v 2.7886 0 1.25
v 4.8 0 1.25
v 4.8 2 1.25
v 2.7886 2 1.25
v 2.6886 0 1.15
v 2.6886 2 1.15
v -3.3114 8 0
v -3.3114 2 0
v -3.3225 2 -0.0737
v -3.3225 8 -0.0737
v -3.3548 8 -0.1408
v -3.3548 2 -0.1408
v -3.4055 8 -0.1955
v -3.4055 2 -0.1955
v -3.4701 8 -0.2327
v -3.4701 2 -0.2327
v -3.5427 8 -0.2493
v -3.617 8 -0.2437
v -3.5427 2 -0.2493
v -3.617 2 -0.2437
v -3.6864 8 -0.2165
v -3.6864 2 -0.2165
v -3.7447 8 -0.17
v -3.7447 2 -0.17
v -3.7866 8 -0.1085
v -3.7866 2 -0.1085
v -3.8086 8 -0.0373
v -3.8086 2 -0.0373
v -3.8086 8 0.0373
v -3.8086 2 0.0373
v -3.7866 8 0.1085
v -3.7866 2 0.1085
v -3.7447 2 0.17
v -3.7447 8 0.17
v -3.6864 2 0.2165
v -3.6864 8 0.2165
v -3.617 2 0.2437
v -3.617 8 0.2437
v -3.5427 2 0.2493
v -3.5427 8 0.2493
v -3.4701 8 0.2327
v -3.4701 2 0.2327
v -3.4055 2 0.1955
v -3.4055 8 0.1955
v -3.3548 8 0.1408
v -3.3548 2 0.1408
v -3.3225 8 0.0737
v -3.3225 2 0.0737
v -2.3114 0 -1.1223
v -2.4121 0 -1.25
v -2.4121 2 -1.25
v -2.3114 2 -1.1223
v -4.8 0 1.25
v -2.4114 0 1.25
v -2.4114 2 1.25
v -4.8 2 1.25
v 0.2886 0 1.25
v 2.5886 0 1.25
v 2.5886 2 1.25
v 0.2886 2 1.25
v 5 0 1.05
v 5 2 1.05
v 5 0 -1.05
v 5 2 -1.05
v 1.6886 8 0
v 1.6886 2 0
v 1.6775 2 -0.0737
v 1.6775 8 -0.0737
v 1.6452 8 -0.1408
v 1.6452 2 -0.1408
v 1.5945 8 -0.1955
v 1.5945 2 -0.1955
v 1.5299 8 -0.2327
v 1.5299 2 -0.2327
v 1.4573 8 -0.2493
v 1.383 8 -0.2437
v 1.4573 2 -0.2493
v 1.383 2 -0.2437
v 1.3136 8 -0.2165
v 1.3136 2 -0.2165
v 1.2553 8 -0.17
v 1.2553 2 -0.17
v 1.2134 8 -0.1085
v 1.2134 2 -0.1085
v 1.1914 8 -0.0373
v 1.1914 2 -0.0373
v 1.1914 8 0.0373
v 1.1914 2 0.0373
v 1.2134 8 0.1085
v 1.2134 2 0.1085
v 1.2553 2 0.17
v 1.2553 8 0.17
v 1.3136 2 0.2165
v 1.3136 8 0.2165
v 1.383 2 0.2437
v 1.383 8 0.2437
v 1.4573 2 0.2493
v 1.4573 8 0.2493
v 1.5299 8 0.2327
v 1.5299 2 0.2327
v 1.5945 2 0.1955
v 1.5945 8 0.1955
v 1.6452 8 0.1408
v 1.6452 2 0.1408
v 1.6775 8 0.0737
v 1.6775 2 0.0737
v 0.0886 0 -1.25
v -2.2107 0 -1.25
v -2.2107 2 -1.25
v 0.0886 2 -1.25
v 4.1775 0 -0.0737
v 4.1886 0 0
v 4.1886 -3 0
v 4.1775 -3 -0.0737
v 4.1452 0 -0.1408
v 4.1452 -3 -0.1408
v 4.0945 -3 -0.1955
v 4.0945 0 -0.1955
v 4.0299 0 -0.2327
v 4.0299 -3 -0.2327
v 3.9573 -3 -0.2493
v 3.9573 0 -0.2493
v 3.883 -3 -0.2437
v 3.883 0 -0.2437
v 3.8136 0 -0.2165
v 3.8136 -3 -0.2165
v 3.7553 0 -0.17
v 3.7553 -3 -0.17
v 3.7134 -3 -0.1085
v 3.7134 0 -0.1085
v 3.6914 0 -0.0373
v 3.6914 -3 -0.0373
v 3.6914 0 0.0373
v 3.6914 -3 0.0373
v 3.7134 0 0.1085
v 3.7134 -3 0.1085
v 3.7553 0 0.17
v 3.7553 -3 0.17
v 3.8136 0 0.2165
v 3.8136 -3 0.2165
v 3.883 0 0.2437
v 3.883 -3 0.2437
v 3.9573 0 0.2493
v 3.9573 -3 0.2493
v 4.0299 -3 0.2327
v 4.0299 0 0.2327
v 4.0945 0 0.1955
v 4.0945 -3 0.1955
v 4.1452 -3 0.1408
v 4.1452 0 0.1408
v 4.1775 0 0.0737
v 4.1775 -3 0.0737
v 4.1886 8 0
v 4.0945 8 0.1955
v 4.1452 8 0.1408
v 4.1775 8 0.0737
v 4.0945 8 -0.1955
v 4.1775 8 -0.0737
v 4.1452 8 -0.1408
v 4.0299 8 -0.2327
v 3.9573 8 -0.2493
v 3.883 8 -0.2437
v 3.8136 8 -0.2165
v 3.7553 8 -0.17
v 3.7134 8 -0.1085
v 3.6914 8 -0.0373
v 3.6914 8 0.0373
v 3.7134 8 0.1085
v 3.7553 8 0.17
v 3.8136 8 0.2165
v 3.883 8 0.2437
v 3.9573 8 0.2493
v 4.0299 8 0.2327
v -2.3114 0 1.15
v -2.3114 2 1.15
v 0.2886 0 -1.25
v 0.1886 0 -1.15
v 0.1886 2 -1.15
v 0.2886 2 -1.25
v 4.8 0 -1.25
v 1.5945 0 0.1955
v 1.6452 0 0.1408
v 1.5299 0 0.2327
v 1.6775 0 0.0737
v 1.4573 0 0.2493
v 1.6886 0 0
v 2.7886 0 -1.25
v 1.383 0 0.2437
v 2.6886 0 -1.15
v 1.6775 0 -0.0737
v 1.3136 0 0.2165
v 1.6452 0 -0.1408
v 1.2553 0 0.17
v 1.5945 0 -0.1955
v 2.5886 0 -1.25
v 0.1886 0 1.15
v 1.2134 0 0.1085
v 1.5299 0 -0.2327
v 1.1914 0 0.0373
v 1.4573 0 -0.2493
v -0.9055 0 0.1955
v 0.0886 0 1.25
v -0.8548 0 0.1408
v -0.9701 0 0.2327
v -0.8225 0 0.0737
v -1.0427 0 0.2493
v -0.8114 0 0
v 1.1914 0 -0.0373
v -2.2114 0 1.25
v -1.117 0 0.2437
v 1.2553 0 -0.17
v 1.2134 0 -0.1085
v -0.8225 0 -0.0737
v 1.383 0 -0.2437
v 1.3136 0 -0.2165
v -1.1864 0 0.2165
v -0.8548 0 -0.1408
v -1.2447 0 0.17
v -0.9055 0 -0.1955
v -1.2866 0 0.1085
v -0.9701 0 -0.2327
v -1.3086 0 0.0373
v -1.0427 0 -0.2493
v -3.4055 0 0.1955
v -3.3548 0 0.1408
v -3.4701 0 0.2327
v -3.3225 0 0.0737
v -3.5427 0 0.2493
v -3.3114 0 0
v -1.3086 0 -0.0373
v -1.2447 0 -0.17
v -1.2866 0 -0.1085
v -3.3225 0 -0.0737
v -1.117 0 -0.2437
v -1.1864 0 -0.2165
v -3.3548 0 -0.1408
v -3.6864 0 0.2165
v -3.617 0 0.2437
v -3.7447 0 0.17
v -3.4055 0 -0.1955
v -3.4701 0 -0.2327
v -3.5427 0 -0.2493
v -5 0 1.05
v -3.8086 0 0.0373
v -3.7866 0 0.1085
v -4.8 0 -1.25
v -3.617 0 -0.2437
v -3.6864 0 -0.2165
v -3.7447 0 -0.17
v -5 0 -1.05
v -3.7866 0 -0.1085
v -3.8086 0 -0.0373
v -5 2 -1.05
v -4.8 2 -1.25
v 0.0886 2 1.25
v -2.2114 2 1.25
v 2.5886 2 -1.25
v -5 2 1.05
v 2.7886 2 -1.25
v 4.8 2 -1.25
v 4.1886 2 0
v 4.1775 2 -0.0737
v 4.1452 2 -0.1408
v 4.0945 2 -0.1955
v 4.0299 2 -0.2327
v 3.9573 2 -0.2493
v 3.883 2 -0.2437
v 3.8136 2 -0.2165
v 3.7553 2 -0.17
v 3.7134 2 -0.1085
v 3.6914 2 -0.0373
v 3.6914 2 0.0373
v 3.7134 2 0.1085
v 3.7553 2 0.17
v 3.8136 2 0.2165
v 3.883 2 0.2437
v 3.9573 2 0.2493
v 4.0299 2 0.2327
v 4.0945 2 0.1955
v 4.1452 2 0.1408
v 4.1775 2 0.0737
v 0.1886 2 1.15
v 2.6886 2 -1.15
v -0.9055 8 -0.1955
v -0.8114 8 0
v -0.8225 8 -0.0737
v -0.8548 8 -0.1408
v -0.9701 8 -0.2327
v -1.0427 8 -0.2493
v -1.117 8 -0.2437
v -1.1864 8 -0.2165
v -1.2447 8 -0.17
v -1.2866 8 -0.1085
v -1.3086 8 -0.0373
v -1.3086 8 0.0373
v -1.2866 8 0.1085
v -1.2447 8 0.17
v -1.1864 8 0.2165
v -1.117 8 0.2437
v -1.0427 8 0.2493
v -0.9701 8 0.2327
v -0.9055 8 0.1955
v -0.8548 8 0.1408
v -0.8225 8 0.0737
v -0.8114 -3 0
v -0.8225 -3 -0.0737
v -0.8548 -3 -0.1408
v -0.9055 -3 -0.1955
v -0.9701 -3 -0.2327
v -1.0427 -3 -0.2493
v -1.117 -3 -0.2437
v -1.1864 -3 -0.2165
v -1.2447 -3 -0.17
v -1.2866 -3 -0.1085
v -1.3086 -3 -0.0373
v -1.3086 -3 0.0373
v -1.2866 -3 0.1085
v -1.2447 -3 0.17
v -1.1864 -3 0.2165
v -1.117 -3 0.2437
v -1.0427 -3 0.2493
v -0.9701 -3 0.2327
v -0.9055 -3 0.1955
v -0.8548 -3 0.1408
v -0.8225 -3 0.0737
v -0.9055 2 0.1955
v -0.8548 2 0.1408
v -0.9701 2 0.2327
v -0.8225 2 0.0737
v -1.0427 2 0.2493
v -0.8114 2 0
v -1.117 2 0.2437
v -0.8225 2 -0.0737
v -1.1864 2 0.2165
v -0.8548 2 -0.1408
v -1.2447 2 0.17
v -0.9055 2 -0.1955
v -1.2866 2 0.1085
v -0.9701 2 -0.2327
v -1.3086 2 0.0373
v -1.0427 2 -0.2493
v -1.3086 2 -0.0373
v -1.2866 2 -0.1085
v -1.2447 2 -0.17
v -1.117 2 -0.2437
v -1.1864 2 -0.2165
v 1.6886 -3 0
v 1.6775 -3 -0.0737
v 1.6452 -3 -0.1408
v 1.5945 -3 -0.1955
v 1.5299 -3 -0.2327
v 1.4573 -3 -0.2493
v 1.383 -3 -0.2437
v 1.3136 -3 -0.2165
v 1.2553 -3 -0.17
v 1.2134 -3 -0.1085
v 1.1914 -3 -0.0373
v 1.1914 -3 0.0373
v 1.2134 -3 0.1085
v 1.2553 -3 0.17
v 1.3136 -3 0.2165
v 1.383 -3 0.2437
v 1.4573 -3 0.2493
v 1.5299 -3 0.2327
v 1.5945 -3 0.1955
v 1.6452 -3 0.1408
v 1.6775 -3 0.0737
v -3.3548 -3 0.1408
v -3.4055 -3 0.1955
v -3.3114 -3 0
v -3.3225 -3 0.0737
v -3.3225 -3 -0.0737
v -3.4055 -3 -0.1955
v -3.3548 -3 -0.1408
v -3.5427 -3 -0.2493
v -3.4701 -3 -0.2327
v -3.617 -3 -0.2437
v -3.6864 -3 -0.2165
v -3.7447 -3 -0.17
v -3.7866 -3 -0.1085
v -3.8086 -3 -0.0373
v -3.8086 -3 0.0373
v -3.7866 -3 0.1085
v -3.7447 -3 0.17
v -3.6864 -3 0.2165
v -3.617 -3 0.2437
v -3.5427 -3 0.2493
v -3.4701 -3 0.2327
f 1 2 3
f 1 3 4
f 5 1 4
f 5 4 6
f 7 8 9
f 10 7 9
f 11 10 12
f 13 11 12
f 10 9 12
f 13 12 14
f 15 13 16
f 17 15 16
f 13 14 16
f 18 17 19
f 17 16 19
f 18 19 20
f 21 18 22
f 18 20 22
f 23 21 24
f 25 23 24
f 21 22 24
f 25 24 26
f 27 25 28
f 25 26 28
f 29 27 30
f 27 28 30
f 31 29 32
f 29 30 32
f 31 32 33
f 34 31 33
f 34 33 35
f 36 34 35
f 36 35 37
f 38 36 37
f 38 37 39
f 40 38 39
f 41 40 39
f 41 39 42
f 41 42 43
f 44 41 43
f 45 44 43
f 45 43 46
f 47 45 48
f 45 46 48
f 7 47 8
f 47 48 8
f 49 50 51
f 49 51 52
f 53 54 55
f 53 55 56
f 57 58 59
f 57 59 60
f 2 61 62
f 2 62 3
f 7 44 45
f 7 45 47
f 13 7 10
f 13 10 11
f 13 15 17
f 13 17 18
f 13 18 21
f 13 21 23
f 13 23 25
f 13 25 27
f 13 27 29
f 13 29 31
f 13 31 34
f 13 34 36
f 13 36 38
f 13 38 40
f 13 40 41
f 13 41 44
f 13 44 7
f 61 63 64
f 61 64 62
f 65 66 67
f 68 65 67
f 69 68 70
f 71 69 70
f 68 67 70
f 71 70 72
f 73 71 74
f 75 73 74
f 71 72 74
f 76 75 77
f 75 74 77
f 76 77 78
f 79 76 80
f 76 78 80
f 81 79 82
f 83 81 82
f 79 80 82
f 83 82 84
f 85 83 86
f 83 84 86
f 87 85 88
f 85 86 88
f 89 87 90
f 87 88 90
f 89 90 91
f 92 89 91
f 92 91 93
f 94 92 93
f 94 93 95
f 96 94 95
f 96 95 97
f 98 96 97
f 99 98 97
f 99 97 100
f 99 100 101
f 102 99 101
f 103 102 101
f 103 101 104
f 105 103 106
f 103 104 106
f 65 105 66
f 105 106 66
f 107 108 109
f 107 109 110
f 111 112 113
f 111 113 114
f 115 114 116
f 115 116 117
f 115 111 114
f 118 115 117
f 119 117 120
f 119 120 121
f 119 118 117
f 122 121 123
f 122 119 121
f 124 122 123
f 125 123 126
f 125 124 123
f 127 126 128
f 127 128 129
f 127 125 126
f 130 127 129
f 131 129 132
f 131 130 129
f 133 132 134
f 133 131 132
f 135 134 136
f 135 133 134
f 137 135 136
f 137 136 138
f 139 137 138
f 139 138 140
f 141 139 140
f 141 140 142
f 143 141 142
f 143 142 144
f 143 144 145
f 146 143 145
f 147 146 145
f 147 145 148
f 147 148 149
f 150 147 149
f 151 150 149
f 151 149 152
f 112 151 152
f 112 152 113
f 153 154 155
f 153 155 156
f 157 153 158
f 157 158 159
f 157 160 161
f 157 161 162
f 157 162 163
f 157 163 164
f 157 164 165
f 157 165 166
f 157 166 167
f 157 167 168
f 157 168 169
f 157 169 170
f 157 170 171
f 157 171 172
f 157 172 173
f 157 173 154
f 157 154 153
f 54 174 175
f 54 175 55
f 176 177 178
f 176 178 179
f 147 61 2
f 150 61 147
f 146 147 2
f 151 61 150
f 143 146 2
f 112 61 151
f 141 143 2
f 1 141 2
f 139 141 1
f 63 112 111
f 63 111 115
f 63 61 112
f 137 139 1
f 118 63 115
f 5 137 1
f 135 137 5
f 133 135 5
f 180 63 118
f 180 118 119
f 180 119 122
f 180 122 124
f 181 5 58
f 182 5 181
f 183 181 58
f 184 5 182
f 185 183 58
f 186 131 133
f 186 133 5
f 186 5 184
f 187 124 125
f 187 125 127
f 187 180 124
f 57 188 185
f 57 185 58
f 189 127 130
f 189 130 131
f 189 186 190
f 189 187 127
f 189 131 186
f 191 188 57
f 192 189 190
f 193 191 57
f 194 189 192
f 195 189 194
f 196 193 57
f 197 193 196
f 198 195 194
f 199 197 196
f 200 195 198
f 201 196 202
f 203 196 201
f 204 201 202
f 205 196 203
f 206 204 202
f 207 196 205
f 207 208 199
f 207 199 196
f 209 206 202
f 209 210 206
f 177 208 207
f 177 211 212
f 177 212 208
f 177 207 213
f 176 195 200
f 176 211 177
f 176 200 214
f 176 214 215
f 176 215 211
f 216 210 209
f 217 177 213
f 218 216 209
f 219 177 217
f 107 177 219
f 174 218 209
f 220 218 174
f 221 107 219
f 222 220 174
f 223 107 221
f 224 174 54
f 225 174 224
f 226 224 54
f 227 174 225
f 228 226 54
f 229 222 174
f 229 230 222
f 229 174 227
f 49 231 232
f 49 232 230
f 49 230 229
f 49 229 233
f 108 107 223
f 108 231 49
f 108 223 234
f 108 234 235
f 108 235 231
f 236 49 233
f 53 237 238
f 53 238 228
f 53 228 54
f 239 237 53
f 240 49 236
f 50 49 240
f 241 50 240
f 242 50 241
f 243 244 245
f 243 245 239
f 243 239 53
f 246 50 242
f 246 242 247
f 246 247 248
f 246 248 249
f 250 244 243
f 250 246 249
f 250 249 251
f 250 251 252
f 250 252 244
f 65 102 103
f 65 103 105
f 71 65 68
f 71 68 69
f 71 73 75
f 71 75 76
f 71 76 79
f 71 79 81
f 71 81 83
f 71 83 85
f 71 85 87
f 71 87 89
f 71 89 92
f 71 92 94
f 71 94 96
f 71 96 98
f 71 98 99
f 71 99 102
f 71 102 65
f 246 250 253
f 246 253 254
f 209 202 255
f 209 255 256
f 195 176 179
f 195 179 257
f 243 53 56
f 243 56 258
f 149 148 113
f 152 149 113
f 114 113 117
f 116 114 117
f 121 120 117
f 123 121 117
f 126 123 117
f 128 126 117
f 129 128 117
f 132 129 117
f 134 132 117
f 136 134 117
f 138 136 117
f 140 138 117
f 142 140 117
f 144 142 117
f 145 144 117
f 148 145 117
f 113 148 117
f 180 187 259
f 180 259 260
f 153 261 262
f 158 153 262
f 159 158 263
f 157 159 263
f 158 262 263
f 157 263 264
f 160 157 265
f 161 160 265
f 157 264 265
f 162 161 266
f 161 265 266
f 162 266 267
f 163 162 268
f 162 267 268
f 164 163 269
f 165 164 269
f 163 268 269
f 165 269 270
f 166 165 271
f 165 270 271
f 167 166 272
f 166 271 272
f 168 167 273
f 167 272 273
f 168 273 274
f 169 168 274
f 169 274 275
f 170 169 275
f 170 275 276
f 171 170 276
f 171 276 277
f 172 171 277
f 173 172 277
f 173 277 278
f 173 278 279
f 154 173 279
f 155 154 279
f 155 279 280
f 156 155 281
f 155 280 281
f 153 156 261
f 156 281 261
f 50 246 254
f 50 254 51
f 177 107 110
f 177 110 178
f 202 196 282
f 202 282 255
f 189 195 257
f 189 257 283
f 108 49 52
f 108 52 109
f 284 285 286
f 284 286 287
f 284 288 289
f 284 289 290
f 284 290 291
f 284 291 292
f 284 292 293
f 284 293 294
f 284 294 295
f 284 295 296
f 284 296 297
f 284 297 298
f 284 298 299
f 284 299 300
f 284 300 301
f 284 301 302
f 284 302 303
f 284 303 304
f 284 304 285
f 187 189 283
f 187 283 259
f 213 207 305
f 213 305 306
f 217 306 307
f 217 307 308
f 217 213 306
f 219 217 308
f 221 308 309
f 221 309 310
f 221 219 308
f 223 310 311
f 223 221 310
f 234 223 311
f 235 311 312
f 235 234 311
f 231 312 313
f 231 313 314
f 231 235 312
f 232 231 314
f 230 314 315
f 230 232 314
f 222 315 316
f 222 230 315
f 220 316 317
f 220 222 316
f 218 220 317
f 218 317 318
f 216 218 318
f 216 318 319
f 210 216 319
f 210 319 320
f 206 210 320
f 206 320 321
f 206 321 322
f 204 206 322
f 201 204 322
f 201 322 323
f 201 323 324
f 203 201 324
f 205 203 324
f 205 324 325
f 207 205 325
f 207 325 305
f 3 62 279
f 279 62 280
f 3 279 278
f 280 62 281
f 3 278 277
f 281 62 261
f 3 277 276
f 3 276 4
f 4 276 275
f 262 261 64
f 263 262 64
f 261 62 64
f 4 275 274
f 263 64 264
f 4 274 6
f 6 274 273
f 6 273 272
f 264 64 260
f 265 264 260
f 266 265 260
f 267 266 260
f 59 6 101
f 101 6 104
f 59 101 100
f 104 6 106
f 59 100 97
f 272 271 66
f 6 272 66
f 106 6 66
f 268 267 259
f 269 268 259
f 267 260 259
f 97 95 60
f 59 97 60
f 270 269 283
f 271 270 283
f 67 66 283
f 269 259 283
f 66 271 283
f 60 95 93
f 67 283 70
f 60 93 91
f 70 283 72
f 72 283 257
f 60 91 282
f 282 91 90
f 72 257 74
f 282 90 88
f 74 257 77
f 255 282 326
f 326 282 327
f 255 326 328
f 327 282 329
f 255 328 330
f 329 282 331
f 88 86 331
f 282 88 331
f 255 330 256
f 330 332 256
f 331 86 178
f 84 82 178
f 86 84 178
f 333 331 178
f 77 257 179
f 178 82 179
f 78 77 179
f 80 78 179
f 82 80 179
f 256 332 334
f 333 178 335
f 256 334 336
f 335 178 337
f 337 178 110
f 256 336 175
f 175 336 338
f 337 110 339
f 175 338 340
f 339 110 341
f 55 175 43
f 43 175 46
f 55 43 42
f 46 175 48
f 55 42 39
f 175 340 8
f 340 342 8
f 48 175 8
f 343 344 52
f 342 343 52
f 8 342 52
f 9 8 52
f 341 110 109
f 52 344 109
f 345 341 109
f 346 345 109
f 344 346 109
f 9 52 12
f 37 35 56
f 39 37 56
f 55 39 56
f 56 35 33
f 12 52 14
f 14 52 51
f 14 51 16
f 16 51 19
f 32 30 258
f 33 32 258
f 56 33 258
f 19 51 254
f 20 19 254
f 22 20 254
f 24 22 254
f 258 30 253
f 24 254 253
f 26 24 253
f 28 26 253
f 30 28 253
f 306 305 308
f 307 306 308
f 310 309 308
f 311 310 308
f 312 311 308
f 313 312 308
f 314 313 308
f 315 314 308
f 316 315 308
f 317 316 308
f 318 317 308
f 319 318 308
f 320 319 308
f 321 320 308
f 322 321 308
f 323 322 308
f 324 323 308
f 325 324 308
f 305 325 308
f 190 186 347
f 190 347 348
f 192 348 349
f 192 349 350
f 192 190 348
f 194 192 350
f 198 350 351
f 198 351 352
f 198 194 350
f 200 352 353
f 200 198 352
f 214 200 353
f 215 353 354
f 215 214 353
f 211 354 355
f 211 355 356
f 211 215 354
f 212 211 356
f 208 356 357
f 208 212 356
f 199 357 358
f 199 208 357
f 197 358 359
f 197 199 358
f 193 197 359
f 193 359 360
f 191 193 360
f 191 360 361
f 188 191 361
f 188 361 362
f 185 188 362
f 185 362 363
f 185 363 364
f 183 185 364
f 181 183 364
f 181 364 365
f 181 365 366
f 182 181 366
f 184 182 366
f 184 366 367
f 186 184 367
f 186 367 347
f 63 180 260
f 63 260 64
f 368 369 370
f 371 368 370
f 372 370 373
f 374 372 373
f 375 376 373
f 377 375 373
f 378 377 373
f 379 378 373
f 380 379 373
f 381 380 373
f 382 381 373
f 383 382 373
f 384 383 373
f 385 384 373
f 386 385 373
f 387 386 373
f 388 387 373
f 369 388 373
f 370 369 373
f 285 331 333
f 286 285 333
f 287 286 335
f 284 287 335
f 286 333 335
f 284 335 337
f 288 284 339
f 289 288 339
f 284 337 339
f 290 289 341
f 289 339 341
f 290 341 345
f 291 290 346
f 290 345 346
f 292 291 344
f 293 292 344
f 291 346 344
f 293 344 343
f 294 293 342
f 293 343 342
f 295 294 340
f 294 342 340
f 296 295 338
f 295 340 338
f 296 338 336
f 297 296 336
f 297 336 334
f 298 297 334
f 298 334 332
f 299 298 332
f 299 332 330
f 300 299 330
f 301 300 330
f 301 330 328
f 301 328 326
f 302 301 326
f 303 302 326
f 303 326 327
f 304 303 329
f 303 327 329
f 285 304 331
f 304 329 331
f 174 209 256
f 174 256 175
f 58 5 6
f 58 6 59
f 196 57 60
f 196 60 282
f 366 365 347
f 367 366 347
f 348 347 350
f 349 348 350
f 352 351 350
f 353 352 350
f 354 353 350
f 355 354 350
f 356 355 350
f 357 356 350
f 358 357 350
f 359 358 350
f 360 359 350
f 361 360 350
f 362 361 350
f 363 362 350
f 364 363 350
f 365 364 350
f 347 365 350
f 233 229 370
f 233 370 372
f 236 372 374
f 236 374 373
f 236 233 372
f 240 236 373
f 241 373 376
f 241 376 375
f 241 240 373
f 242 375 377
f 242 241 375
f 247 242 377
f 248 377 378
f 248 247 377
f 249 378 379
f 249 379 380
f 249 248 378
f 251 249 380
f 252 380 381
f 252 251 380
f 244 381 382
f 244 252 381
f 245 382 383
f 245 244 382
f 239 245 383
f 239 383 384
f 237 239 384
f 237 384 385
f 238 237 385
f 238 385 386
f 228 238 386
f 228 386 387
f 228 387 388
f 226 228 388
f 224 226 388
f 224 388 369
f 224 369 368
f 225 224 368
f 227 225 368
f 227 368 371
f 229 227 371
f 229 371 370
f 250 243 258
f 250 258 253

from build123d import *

# Parameters (mm, degrees)
IZIM1_R                          = 0.25
Y_KSEKLIK_EKSTR_ZYON1_DEPTH      = 2
IZIM2_R                          = 0.25
Y_KSEKLIK_EKSTR_ZYON2_DEPTH      = 6
Y_KSEKLIK_EKSTR_ZYON2_DEPTH_BACK = 5


with BuildPart() as part:
    # Çizim1 → Yükseklik-Ekstrüzyon1 (new body)
    with BuildSketch(Plane(origin=(0, 0, 0), x_dir=(1, 0, 0), z_dir=(0, 1, 0))):
        Polygon((-4.8, 1.25), (-2.412060191, 1.25), (-2.311389974, 1.122349253), (-2.210719757, 1.25), (0.088610026, 1.25), (0.188610026, 1.15), (0.288610026, 1.25), (2.588610026, 1.25), (2.688610026, 1.15), (2.788610026, 1.25), (4.8, 1.25), (5, 1.05), (5, -1.05), (4.8, -1.25), (2.788610026, -1.25), (2.688610026, -1.15), (2.588610026, -1.25), (0.288610026, -1.25), (0.188610026, -1.15), (0.088610026, -1.25), (-2.211389974, -1.25), (-2.311389974, -1.15), (-2.411389974, -1.25), (-4.8, -1.25), (-5, -1.05), (-5, 1.05), align=None)
        with Locations((-3.561389974, 0)):
            Circle(IZIM1_R, mode=Mode.SUBTRACT)
        with Locations((-1.061389974, 0)):
            Circle(IZIM1_R, mode=Mode.SUBTRACT)
        with Locations((1.438610026, 0)):
            Circle(IZIM1_R, mode=Mode.SUBTRACT)
        with Locations((3.938610026, 0)):
            Circle(IZIM1_R, mode=Mode.SUBTRACT)
    extrude(amount=Y_KSEKLIK_EKSTR_ZYON1_DEPTH)

    # Çizim2 → Yükseklik-Ekstrüzyon2 (add, two sides)
    with BuildSketch(Plane(origin=(0, 2, 0), x_dir=(1, 0, 0), z_dir=(0, 1, 0))) as y_kseklik_ekstr_zyon2_sk:
        with Locations((-3.561389974, 0)):
            Circle(IZIM2_R)
        with Locations((-1.061389974, 0)):
            Circle(IZIM2_R)
        with Locations((1.438610026, 0)):
            Circle(IZIM2_R)
        with Locations((3.938610026, 0)):
            Circle(IZIM2_R)
    extrude(amount=Y_KSEKLIK_EKSTR_ZYON2_DEPTH)
    extrude(y_kseklik_ekstr_zyon2_sk.sketch, amount=-Y_KSEKLIK_EKSTR_ZYON2_DEPTH_BACK)


solid = part.part
